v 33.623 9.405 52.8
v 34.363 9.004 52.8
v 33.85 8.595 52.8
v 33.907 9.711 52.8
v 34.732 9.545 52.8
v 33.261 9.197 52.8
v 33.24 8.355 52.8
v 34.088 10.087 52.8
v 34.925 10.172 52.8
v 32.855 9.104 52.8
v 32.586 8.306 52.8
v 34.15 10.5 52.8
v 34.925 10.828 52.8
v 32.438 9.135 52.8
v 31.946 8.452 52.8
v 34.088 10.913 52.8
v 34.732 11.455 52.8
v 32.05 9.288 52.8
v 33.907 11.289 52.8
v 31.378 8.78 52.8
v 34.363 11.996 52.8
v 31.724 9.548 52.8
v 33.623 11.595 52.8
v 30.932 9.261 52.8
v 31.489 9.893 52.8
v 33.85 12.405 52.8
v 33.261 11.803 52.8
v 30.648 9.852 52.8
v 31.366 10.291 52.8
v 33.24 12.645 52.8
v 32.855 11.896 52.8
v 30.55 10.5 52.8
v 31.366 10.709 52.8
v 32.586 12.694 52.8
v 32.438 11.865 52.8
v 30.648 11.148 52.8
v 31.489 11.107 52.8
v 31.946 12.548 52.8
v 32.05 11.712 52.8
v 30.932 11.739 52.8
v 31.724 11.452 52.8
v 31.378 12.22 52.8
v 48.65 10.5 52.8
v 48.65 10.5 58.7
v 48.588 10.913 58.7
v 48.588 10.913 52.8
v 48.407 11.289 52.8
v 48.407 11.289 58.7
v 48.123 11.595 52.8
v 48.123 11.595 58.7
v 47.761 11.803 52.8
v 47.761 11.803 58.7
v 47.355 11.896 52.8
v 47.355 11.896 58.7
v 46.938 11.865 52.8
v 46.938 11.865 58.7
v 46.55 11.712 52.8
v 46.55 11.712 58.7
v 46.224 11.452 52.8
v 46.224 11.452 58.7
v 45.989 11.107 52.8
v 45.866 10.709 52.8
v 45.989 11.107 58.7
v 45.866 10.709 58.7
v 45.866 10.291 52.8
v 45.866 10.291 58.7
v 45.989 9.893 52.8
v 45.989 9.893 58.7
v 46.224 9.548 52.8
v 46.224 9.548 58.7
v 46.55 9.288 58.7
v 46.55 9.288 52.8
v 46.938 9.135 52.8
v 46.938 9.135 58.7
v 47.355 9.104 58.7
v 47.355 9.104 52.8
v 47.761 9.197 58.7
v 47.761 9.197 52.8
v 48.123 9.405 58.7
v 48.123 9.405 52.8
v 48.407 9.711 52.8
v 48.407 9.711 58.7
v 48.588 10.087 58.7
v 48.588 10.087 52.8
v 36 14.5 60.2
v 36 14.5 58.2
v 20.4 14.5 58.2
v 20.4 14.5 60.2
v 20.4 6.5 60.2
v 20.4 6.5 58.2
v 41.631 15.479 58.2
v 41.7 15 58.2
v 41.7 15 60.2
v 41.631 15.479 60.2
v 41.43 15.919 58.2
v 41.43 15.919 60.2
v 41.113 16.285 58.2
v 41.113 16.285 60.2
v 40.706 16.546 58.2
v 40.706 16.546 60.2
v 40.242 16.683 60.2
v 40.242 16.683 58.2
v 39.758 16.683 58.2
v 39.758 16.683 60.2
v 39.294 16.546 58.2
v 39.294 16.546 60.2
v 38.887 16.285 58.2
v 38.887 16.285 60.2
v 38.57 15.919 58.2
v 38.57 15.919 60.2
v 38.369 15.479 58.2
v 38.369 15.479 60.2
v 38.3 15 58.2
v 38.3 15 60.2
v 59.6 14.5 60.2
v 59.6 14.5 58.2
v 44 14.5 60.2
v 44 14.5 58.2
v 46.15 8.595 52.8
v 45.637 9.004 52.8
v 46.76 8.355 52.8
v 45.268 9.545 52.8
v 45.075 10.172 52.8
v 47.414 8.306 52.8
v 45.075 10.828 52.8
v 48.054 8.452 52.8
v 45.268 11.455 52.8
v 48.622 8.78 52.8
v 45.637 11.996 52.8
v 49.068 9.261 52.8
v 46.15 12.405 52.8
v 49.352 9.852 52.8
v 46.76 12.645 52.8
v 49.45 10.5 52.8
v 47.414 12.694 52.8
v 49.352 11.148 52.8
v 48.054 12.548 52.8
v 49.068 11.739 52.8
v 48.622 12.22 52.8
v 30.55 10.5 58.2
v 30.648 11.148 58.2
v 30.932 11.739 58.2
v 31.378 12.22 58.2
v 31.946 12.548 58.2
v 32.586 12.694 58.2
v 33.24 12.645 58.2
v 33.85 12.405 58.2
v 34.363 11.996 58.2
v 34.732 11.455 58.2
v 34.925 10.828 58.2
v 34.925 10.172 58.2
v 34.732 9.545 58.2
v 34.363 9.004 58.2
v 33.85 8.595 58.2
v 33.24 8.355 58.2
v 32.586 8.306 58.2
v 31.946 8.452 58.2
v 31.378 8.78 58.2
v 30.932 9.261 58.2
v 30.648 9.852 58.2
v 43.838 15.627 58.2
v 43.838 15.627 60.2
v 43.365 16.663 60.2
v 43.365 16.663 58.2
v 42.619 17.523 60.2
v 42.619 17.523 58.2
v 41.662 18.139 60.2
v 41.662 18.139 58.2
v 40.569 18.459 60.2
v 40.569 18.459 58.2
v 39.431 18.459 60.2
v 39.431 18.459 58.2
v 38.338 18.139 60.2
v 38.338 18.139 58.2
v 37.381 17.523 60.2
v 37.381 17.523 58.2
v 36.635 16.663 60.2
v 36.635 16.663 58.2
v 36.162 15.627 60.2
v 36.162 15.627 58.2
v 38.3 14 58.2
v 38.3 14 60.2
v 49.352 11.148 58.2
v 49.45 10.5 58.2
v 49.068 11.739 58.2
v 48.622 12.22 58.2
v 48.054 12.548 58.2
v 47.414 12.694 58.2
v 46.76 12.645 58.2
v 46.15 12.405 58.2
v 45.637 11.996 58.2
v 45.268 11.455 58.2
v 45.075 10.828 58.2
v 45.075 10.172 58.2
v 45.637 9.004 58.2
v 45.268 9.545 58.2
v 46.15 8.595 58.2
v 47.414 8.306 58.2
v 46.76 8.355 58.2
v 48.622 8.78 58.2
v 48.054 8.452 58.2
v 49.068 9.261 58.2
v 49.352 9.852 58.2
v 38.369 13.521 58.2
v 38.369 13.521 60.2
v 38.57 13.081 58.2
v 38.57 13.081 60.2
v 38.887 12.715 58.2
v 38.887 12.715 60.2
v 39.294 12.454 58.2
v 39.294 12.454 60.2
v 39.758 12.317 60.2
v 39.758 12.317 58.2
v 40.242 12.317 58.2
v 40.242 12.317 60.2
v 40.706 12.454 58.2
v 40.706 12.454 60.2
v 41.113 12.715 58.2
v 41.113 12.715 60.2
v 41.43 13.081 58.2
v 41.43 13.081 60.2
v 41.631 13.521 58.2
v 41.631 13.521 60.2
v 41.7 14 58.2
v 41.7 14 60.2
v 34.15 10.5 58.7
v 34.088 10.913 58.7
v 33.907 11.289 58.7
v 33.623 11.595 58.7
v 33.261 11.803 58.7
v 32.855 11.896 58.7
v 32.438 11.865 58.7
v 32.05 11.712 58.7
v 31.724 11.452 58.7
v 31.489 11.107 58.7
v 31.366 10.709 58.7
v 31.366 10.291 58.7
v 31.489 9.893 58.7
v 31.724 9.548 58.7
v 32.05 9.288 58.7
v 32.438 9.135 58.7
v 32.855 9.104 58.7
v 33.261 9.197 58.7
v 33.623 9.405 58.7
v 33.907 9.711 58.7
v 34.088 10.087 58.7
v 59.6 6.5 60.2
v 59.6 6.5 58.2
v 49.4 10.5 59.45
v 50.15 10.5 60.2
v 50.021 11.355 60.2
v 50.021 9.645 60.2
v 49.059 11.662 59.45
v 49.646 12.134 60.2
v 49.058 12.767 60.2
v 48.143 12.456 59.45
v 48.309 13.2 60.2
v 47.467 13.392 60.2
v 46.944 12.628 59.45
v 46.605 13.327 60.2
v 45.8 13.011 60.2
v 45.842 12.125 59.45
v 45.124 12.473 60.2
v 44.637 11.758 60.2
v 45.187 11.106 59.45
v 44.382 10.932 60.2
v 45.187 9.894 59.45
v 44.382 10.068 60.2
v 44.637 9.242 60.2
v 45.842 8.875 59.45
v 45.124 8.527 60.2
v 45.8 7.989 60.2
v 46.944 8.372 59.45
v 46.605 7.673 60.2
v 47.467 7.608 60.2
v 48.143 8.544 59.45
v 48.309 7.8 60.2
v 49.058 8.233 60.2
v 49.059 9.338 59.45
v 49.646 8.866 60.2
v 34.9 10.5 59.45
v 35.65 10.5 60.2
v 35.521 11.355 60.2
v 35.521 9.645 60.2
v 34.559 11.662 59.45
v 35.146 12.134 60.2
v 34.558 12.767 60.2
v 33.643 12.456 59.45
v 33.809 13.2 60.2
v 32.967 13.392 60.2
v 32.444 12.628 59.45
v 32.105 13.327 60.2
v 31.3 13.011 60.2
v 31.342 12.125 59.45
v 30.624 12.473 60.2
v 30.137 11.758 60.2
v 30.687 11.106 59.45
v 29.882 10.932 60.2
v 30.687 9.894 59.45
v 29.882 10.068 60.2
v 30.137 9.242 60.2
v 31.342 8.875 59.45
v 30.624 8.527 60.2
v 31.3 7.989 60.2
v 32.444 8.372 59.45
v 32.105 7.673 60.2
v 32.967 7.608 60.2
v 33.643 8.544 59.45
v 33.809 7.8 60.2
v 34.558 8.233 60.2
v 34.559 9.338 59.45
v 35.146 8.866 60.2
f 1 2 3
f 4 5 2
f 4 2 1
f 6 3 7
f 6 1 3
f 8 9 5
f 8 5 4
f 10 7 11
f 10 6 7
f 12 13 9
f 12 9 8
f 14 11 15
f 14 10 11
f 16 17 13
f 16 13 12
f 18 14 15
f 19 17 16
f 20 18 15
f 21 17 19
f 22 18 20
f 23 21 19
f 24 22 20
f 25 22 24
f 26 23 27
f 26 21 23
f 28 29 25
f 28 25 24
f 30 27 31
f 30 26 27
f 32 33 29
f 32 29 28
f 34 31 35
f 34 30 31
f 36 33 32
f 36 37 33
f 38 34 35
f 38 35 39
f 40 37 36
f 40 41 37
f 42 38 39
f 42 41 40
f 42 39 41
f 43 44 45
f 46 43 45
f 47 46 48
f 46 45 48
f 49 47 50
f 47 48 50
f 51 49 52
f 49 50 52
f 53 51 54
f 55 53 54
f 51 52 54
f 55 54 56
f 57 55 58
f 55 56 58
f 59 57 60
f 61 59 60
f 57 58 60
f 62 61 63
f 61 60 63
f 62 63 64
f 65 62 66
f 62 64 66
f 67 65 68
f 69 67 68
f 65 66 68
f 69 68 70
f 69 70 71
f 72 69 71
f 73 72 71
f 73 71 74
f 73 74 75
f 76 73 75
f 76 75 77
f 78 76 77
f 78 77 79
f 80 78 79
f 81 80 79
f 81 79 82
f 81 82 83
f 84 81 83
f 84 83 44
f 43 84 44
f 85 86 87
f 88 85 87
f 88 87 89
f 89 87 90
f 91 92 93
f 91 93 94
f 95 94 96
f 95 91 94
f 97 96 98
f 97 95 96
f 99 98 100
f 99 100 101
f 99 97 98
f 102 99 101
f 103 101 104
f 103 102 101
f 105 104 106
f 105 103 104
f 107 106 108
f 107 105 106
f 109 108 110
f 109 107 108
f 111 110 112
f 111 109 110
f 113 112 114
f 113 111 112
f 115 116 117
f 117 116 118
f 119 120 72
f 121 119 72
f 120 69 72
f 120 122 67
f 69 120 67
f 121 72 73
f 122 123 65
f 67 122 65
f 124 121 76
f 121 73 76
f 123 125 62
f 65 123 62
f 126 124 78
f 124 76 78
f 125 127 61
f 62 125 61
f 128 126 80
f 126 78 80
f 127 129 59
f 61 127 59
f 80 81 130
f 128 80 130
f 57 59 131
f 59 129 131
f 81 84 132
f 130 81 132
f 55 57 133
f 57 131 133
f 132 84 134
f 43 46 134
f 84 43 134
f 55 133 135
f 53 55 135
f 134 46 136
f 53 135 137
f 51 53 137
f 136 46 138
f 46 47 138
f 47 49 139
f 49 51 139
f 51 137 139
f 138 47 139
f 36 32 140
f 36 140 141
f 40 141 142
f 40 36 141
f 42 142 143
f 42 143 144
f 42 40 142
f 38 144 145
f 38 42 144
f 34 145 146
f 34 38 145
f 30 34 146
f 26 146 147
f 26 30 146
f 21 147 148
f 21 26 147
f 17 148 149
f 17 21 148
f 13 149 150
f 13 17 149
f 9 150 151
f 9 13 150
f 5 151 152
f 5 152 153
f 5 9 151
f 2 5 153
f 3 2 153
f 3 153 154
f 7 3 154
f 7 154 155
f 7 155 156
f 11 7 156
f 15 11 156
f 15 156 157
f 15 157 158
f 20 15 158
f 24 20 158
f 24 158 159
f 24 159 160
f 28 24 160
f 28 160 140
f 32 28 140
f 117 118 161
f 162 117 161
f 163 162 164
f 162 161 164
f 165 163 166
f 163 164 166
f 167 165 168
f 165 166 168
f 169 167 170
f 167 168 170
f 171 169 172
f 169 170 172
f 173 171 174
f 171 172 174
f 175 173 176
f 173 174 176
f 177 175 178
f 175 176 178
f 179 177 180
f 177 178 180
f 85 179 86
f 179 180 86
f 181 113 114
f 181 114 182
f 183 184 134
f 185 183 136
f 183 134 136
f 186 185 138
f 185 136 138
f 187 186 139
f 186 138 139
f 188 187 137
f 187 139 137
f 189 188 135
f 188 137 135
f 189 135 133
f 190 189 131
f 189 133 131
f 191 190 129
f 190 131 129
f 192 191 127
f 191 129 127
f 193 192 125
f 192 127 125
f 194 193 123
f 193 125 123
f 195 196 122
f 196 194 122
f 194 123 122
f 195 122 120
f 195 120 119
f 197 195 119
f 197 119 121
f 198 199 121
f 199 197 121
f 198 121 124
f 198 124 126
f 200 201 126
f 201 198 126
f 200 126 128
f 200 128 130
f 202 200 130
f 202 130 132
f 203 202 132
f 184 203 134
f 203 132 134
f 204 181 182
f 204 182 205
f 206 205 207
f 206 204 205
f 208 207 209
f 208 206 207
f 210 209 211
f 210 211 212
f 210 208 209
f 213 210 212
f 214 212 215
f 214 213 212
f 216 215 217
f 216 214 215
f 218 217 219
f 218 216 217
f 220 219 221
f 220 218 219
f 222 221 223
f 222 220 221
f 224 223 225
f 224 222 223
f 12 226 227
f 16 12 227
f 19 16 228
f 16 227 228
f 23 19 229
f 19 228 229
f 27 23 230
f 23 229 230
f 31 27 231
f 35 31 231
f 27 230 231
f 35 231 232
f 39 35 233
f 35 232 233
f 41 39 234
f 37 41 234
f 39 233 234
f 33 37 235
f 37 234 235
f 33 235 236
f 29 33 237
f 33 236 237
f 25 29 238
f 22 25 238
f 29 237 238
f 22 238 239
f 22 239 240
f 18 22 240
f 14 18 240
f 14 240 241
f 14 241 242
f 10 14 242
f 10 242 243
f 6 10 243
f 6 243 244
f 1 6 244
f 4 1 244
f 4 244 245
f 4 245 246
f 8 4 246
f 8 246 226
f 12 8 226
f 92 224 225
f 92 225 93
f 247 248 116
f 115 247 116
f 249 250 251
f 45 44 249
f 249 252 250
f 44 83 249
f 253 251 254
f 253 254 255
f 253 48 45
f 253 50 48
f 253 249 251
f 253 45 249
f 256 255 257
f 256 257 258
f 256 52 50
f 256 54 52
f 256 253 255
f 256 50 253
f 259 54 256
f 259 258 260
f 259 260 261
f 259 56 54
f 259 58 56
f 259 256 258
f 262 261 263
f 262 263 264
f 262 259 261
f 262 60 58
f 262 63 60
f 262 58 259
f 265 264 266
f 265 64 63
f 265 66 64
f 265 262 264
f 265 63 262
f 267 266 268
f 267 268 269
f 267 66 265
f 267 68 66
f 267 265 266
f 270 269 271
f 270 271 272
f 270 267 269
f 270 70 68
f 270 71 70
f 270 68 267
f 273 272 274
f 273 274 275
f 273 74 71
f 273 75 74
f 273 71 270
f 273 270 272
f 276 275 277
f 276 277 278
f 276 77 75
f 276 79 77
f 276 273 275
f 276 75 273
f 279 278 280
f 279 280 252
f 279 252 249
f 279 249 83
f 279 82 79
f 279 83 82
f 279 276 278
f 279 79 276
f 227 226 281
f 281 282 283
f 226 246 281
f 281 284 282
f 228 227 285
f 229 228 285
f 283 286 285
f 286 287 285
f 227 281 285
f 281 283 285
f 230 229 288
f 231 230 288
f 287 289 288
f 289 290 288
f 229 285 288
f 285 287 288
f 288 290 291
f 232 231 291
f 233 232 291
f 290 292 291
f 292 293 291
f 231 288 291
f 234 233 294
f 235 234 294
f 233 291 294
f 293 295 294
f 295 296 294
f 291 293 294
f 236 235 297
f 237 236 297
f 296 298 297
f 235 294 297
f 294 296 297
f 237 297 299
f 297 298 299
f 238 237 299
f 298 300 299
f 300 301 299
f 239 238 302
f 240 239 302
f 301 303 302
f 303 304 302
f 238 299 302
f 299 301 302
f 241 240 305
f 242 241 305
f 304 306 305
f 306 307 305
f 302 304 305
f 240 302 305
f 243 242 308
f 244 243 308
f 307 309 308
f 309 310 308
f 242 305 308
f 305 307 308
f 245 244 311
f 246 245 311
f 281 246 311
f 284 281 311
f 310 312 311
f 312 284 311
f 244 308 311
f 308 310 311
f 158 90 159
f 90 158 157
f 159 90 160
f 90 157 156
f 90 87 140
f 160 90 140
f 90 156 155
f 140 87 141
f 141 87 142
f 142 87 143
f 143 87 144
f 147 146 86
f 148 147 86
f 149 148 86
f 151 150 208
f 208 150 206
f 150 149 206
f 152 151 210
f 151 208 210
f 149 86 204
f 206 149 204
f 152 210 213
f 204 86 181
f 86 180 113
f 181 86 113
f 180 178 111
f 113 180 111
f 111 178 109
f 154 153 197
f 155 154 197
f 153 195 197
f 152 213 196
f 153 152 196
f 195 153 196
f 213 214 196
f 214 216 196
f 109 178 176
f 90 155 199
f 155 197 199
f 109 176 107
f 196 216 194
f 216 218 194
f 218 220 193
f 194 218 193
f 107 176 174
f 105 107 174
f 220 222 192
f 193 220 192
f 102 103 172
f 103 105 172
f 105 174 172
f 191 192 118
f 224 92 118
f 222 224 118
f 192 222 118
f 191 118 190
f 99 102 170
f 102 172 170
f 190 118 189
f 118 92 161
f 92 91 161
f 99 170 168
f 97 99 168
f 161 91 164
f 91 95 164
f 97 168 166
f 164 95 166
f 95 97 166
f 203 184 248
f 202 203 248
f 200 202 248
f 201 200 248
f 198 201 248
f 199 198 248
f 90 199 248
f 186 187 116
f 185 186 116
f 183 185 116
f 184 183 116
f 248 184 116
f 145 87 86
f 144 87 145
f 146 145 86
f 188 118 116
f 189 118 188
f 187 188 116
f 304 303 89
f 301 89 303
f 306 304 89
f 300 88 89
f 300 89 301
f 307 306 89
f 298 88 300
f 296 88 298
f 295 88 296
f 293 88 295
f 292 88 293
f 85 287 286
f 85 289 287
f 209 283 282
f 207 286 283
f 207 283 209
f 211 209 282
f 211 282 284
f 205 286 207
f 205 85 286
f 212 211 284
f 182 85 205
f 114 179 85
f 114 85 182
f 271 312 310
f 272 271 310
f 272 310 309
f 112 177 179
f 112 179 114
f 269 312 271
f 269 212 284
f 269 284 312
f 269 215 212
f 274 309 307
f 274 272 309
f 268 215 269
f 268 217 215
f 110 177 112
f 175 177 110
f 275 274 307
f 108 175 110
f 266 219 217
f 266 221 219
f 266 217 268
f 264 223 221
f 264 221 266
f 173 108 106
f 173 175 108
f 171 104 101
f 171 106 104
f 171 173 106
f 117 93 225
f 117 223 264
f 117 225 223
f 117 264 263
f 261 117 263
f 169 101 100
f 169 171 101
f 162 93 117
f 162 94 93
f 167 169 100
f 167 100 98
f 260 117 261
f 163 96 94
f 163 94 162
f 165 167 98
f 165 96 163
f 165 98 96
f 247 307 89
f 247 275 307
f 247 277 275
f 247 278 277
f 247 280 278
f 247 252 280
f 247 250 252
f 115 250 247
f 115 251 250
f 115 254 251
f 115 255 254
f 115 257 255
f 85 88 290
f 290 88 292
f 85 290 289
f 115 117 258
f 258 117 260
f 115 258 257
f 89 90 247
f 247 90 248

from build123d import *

# Parameters (mm, degrees)
PAD072_DEPTH            = 2
CYLINDER084_R           = 2.2
CYLINDER084_DEPTH       = 7
SKETCH123_R             = 1.4
POCKET026_DEPTH         = 7.401
CHAMFER001_SIZE         = 1.5
BODY090_PLACEMENT_ANGLE = 180
BODY093_ROLL_ANGLE      = 90
BODY093_PLACEMENT_ANGLE = 180


with BuildPart() as part:
    # Sketch122 → Pad072 (new body)
    with BuildSketch(Plane.XZ):
        with BuildLine():
            Line((-4, -2.5), (-19.6, -2.5))
            Line((-19.6, -2.5), (-19.6, -10.5))
            Line((-19.6, -10.5), (19.6, -10.5))
            Line((19.6, -10.5), (19.6, -2.5))
            Line((19.6, -2.5), (4, -2.5))
            ThreePointArc((4, -2.5), (0, 1.5), (-4, -2.5))
        make_face()
        with BuildLine():
            ThreePointArc((1.7, -2), (0, -0.3), (-1.7, -2))
            Line((-1.7, -2), (-1.7, -3))
            ThreePointArc((-1.7, -3), (0, -4.7), (1.7, -3))
            Line((1.7, -3), (1.7, -2))
        make_face(mode=Mode.SUBTRACT)
    extrude(amount=PAD072_DEPTH)

    # Cylinder084 → Cylinder084 (join)
    with BuildSketch(Plane(origin=(7.25, 5.4, -6.5), x_dir=(1, 0, 0), z_dir=(0, -1, 0))):
        Circle(CYLINDER084_R)
    cylinder084 = extrude(amount=CYLINDER084_DEPTH)

    # Mirrored020: Cylinder084 across YZ
    add(cylinder084.mirror(Plane.YZ))

    # Sketch123 → Pocket026 (cut, through all)
    with BuildSketch(Plane.XZ.offset(2)):
        with Locations((-7.25, -6.5)):
            Circle(SKETCH123_R)
        with Locations((7.25, -6.5)):
            Circle(SKETCH123_R)
    extrude(amount=-POCKET026_DEPTH, mode=Mode.SUBTRACT)

    # Chamfer001
    chamfer001_edges = [part.edges().sort_by_distance(p)[0] for p in [
        (-8.65, -2, -6.5),
        (5.85, -2, -6.5),
    ]]
    chamfer(chamfer001_edges, length=CHAMFER001_SIZE)


with BuildPart() as part_1:
    # Body090 placement: moved
    add(part.part.moved(Location((0, 4.2, 0))).rotate(Axis((0, 4.2, 0), (0, 0, 1)), BODY090_PLACEMENT_ANGLE))


with BuildPart() as part_2:
    # Clone023 placement: moved
    add(part_1.part.moved(Location((0, -4.2, 0))))


with BuildPart() as part_3:
    # Body093 roll: moved
    add(part_2.part.rotate(Axis((0, 0, 0), (1, 0, 0)), BODY093_ROLL_ANGLE))


with BuildPart() as part_4:
    # Body093 placement: moved
    add(part_3.part.moved(Location((40, 17, 58.2))).rotate(Axis((40, 17, 58.2), (0, 0, 1)), BODY093_PLACEMENT_ANGLE))


solid = part_4.part
